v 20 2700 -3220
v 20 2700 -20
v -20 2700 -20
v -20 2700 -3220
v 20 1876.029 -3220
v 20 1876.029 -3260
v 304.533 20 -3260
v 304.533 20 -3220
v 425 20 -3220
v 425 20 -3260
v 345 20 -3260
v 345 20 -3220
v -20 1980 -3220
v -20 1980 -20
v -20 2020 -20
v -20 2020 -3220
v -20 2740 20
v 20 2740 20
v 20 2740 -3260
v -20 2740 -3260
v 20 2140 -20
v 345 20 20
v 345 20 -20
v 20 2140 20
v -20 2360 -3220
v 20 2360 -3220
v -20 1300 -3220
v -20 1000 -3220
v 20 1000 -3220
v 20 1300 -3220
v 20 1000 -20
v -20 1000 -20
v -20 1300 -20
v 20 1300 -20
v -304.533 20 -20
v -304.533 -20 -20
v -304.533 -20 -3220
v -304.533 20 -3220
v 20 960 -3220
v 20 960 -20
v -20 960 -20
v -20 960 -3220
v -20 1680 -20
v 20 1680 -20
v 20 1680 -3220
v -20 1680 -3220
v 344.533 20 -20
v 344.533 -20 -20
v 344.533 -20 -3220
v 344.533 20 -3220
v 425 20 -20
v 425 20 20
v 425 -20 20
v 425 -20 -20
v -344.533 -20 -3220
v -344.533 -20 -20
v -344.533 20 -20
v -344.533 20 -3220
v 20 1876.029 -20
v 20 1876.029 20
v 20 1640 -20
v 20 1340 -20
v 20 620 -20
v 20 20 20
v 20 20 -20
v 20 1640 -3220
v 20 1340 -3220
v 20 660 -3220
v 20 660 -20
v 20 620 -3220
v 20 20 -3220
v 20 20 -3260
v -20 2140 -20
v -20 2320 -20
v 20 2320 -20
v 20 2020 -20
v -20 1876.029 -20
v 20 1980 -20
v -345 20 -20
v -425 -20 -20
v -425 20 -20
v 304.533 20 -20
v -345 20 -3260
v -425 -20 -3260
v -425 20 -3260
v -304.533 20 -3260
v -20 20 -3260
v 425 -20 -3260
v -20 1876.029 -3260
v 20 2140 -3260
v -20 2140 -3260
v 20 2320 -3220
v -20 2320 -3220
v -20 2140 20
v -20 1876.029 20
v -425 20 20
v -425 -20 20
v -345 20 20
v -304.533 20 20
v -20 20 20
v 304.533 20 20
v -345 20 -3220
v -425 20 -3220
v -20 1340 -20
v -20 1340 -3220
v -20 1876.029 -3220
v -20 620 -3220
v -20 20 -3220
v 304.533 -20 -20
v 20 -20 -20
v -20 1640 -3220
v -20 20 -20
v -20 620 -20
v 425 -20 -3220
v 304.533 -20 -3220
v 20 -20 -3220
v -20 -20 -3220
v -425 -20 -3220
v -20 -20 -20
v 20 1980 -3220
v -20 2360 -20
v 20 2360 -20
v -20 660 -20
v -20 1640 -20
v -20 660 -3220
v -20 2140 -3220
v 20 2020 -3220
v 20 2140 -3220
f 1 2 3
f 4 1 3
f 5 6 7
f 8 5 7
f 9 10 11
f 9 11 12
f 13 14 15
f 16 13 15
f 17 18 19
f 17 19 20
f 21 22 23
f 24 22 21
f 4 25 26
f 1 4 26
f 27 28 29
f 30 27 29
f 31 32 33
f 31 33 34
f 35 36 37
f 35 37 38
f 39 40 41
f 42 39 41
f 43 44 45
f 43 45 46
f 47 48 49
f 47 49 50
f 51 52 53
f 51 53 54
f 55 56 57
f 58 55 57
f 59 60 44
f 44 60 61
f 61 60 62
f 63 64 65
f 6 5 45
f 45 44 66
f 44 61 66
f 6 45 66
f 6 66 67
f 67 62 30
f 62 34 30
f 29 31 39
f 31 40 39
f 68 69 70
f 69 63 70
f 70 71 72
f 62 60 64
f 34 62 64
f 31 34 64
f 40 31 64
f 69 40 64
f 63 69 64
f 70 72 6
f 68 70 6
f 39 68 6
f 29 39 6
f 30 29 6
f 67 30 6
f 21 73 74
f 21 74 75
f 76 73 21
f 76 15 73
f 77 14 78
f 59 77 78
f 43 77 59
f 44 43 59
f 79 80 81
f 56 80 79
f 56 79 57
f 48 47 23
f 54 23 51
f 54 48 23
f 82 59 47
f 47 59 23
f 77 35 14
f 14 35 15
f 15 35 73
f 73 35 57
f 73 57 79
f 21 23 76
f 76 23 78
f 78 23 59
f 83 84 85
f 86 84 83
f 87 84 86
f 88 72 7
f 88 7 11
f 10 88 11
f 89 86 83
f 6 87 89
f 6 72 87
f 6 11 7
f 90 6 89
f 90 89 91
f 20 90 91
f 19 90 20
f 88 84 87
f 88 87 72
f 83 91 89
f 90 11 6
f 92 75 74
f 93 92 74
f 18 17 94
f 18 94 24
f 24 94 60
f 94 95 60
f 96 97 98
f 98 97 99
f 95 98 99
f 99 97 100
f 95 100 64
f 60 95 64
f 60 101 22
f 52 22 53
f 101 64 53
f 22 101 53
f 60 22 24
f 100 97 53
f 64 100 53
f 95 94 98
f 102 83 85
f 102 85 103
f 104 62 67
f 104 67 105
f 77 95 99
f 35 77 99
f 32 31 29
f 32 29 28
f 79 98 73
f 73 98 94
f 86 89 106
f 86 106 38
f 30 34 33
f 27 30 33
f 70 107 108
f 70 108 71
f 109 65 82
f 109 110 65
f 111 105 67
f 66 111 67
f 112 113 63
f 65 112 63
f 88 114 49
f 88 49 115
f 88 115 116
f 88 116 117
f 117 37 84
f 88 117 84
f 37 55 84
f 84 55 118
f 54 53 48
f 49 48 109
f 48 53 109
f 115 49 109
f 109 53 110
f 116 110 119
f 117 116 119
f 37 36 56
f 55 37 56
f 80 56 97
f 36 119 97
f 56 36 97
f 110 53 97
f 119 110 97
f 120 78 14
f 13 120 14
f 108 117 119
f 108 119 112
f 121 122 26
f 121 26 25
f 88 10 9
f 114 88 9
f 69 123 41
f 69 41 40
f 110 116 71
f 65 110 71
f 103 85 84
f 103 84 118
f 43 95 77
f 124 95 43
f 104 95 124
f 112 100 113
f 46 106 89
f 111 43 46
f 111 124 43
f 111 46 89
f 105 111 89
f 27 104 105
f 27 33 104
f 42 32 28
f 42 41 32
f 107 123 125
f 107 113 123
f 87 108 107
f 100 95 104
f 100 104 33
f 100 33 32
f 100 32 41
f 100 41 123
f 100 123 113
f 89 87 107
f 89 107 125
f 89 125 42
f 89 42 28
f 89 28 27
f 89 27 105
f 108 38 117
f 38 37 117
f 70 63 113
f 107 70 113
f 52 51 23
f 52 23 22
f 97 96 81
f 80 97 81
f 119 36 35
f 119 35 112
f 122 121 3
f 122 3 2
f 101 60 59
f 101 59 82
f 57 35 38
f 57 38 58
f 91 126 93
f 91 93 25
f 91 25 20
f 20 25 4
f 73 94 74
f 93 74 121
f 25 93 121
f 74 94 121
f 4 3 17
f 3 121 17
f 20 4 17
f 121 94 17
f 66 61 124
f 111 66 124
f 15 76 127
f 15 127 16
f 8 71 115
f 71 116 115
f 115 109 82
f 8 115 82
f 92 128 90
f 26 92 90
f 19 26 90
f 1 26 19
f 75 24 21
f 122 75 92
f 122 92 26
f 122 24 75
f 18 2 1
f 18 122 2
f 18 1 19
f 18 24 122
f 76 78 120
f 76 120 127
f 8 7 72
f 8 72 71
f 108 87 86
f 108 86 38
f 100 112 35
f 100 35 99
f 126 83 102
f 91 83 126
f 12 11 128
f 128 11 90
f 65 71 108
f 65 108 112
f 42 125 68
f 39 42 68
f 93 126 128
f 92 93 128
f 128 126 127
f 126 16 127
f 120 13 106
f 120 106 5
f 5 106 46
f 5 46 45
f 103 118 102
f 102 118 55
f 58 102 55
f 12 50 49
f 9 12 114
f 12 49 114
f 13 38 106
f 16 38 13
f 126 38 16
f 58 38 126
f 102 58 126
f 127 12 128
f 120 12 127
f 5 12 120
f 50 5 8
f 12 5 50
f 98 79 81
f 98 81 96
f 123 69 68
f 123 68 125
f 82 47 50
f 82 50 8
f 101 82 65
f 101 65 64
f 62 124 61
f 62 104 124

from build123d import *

# Parameters (mm, degrees)
CROQUIS1_W     = 40
CROQUIS1_H     = 40
EXTRUIR1_DEPTH = 425
CROQUIS2_W     = 40
CROQUIS2_H     = 40
EXTRUIR2_DEPTH = 1600
CROQUIS3_W     = 40
CROQUIS3_H     = 40
EXTRUIR3_DEPTH = 2720
EXTRUIR4_DEPTH = 40
CROQUIS5_W     = 40
CROQUIS5_H     = 40
EXTRUIR5_DEPTH = 3200
CROQUIS6_W     = 40
CROQUIS6_H     = 40
EXTRUIR6_DEPTH = 3200


with BuildPart() as part:
    # Croquis1 → Extruir1 (new, symmetric)
    with BuildSketch(Plane(origin=(0, 0, 0), x_dir=(0, 0, -1), z_dir=(1, 0, 0))):
        Rectangle(CROQUIS1_W, CROQUIS1_H)
    extrude(amount=EXTRUIR1_DEPTH, both=True)

    # Croquis2 → Extruir2 (add)
    with BuildSketch(Plane(origin=(0, 0, -20), x_dir=(-1, 0, 0), z_dir=(0, 0, -1))):
        Rectangle(CROQUIS2_W, CROQUIS2_H)
    extrude(amount=EXTRUIR2_DEPTH)

    # Simetría1: part across plane


with BuildPart() as part_1:
    add(part.part)
    add(part.part.mirror(Plane(origin=(-20, 20, -1620), x_dir=(1, 0, 0), z_dir=(0, 0, 1))))

    # Croquis3 → Extruir3 (add)
    with BuildSketch(Plane(origin=(0, 20, 0), x_dir=(1, 0, 0), z_dir=(0, 1, 0))):
        Rectangle(CROQUIS3_W, CROQUIS3_H)
        with Locations((0, 3240)):
            Rectangle(CROQUIS3_W, CROQUIS3_H)
    extrude(amount=EXTRUIR3_DEPTH)



with BuildPart() as body_2:
    # Croquis4 → Extruir4 (new body)
    with BuildSketch(Plane.XY.offset(20)):
        Polygon((345, 20), (20, 2140), (20, 1876.028690818), (304.532700243, 20), align=None)
    extrude(amount=-EXTRUIR4_DEPTH)


with BuildPart() as body_3:
    # Simetría2: mirrored copy
    add(body_2.part.mirror(Plane(origin=(0, 0, 0), x_dir=(0, 0, 1), z_dir=(1, 0, 0))))


with BuildPart() as body_4:
    # Simetría3: mirrored copy
    add(body_3.part.mirror(Plane(origin=(0, 0, -1620), x_dir=(1, 0, 0), z_dir=(0, 0, -1))))


with BuildPart() as body_5:
    # Simetr_a3 2: mirrored copy
    add(body_2.part.mirror(Plane(origin=(0, 0, -1620), x_dir=(1, 0, 0), z_dir=(0, 0, -1))))


with BuildPart() as part_2:
    add(part_1.part)

    add(body_2.part)  # Extruir5 merges body 2

    add(body_3.part)  # Extruir5 merges body 3

    add(body_4.part)  # Extruir5 merges body 4

    add(body_5.part)  # Extruir5 merges body 5
    # Croquis5 → Extruir5 (add)
    with BuildSketch(Plane(origin=(0, 0, -20), x_dir=(-1, 0, 0), z_dir=(0, 0, -1))):
        with Locations((0, 640)):
            Rectangle(CROQUIS5_W, CROQUIS5_H)
        with Locations((0, 980)):
            Rectangle(CROQUIS5_W, CROQUIS5_H)
        with Locations((0, 1320)):
            Rectangle(CROQUIS5_W, CROQUIS5_H)
        with Locations((0, 1660)):
            Rectangle(CROQUIS5_W, CROQUIS5_H)
        with Locations((0, 2000)):
            Rectangle(CROQUIS5_W, CROQUIS5_H)
        with Locations((0, 2340)):
            Rectangle(CROQUIS5_W, CROQUIS5_H)
        with Locations((0, 2720)):
            Rectangle(CROQUIS5_W, CROQUIS5_H)
    extrude(amount=EXTRUIR5_DEPTH)

    # Croquis6 → Extruir6 (add)
    with BuildSketch(Plane(origin=(0, 0, -20), x_dir=(-1, 0, 0), z_dir=(0, 0, -1))):
        with Locations((-324.532700243, 0)):
            Rectangle(CROQUIS6_W, CROQUIS6_H)
        with Locations((324.532700243, 0)):
            Rectangle(CROQUIS6_W, CROQUIS6_H)
    extrude(amount=EXTRUIR6_DEPTH)


solid = part_2.part
